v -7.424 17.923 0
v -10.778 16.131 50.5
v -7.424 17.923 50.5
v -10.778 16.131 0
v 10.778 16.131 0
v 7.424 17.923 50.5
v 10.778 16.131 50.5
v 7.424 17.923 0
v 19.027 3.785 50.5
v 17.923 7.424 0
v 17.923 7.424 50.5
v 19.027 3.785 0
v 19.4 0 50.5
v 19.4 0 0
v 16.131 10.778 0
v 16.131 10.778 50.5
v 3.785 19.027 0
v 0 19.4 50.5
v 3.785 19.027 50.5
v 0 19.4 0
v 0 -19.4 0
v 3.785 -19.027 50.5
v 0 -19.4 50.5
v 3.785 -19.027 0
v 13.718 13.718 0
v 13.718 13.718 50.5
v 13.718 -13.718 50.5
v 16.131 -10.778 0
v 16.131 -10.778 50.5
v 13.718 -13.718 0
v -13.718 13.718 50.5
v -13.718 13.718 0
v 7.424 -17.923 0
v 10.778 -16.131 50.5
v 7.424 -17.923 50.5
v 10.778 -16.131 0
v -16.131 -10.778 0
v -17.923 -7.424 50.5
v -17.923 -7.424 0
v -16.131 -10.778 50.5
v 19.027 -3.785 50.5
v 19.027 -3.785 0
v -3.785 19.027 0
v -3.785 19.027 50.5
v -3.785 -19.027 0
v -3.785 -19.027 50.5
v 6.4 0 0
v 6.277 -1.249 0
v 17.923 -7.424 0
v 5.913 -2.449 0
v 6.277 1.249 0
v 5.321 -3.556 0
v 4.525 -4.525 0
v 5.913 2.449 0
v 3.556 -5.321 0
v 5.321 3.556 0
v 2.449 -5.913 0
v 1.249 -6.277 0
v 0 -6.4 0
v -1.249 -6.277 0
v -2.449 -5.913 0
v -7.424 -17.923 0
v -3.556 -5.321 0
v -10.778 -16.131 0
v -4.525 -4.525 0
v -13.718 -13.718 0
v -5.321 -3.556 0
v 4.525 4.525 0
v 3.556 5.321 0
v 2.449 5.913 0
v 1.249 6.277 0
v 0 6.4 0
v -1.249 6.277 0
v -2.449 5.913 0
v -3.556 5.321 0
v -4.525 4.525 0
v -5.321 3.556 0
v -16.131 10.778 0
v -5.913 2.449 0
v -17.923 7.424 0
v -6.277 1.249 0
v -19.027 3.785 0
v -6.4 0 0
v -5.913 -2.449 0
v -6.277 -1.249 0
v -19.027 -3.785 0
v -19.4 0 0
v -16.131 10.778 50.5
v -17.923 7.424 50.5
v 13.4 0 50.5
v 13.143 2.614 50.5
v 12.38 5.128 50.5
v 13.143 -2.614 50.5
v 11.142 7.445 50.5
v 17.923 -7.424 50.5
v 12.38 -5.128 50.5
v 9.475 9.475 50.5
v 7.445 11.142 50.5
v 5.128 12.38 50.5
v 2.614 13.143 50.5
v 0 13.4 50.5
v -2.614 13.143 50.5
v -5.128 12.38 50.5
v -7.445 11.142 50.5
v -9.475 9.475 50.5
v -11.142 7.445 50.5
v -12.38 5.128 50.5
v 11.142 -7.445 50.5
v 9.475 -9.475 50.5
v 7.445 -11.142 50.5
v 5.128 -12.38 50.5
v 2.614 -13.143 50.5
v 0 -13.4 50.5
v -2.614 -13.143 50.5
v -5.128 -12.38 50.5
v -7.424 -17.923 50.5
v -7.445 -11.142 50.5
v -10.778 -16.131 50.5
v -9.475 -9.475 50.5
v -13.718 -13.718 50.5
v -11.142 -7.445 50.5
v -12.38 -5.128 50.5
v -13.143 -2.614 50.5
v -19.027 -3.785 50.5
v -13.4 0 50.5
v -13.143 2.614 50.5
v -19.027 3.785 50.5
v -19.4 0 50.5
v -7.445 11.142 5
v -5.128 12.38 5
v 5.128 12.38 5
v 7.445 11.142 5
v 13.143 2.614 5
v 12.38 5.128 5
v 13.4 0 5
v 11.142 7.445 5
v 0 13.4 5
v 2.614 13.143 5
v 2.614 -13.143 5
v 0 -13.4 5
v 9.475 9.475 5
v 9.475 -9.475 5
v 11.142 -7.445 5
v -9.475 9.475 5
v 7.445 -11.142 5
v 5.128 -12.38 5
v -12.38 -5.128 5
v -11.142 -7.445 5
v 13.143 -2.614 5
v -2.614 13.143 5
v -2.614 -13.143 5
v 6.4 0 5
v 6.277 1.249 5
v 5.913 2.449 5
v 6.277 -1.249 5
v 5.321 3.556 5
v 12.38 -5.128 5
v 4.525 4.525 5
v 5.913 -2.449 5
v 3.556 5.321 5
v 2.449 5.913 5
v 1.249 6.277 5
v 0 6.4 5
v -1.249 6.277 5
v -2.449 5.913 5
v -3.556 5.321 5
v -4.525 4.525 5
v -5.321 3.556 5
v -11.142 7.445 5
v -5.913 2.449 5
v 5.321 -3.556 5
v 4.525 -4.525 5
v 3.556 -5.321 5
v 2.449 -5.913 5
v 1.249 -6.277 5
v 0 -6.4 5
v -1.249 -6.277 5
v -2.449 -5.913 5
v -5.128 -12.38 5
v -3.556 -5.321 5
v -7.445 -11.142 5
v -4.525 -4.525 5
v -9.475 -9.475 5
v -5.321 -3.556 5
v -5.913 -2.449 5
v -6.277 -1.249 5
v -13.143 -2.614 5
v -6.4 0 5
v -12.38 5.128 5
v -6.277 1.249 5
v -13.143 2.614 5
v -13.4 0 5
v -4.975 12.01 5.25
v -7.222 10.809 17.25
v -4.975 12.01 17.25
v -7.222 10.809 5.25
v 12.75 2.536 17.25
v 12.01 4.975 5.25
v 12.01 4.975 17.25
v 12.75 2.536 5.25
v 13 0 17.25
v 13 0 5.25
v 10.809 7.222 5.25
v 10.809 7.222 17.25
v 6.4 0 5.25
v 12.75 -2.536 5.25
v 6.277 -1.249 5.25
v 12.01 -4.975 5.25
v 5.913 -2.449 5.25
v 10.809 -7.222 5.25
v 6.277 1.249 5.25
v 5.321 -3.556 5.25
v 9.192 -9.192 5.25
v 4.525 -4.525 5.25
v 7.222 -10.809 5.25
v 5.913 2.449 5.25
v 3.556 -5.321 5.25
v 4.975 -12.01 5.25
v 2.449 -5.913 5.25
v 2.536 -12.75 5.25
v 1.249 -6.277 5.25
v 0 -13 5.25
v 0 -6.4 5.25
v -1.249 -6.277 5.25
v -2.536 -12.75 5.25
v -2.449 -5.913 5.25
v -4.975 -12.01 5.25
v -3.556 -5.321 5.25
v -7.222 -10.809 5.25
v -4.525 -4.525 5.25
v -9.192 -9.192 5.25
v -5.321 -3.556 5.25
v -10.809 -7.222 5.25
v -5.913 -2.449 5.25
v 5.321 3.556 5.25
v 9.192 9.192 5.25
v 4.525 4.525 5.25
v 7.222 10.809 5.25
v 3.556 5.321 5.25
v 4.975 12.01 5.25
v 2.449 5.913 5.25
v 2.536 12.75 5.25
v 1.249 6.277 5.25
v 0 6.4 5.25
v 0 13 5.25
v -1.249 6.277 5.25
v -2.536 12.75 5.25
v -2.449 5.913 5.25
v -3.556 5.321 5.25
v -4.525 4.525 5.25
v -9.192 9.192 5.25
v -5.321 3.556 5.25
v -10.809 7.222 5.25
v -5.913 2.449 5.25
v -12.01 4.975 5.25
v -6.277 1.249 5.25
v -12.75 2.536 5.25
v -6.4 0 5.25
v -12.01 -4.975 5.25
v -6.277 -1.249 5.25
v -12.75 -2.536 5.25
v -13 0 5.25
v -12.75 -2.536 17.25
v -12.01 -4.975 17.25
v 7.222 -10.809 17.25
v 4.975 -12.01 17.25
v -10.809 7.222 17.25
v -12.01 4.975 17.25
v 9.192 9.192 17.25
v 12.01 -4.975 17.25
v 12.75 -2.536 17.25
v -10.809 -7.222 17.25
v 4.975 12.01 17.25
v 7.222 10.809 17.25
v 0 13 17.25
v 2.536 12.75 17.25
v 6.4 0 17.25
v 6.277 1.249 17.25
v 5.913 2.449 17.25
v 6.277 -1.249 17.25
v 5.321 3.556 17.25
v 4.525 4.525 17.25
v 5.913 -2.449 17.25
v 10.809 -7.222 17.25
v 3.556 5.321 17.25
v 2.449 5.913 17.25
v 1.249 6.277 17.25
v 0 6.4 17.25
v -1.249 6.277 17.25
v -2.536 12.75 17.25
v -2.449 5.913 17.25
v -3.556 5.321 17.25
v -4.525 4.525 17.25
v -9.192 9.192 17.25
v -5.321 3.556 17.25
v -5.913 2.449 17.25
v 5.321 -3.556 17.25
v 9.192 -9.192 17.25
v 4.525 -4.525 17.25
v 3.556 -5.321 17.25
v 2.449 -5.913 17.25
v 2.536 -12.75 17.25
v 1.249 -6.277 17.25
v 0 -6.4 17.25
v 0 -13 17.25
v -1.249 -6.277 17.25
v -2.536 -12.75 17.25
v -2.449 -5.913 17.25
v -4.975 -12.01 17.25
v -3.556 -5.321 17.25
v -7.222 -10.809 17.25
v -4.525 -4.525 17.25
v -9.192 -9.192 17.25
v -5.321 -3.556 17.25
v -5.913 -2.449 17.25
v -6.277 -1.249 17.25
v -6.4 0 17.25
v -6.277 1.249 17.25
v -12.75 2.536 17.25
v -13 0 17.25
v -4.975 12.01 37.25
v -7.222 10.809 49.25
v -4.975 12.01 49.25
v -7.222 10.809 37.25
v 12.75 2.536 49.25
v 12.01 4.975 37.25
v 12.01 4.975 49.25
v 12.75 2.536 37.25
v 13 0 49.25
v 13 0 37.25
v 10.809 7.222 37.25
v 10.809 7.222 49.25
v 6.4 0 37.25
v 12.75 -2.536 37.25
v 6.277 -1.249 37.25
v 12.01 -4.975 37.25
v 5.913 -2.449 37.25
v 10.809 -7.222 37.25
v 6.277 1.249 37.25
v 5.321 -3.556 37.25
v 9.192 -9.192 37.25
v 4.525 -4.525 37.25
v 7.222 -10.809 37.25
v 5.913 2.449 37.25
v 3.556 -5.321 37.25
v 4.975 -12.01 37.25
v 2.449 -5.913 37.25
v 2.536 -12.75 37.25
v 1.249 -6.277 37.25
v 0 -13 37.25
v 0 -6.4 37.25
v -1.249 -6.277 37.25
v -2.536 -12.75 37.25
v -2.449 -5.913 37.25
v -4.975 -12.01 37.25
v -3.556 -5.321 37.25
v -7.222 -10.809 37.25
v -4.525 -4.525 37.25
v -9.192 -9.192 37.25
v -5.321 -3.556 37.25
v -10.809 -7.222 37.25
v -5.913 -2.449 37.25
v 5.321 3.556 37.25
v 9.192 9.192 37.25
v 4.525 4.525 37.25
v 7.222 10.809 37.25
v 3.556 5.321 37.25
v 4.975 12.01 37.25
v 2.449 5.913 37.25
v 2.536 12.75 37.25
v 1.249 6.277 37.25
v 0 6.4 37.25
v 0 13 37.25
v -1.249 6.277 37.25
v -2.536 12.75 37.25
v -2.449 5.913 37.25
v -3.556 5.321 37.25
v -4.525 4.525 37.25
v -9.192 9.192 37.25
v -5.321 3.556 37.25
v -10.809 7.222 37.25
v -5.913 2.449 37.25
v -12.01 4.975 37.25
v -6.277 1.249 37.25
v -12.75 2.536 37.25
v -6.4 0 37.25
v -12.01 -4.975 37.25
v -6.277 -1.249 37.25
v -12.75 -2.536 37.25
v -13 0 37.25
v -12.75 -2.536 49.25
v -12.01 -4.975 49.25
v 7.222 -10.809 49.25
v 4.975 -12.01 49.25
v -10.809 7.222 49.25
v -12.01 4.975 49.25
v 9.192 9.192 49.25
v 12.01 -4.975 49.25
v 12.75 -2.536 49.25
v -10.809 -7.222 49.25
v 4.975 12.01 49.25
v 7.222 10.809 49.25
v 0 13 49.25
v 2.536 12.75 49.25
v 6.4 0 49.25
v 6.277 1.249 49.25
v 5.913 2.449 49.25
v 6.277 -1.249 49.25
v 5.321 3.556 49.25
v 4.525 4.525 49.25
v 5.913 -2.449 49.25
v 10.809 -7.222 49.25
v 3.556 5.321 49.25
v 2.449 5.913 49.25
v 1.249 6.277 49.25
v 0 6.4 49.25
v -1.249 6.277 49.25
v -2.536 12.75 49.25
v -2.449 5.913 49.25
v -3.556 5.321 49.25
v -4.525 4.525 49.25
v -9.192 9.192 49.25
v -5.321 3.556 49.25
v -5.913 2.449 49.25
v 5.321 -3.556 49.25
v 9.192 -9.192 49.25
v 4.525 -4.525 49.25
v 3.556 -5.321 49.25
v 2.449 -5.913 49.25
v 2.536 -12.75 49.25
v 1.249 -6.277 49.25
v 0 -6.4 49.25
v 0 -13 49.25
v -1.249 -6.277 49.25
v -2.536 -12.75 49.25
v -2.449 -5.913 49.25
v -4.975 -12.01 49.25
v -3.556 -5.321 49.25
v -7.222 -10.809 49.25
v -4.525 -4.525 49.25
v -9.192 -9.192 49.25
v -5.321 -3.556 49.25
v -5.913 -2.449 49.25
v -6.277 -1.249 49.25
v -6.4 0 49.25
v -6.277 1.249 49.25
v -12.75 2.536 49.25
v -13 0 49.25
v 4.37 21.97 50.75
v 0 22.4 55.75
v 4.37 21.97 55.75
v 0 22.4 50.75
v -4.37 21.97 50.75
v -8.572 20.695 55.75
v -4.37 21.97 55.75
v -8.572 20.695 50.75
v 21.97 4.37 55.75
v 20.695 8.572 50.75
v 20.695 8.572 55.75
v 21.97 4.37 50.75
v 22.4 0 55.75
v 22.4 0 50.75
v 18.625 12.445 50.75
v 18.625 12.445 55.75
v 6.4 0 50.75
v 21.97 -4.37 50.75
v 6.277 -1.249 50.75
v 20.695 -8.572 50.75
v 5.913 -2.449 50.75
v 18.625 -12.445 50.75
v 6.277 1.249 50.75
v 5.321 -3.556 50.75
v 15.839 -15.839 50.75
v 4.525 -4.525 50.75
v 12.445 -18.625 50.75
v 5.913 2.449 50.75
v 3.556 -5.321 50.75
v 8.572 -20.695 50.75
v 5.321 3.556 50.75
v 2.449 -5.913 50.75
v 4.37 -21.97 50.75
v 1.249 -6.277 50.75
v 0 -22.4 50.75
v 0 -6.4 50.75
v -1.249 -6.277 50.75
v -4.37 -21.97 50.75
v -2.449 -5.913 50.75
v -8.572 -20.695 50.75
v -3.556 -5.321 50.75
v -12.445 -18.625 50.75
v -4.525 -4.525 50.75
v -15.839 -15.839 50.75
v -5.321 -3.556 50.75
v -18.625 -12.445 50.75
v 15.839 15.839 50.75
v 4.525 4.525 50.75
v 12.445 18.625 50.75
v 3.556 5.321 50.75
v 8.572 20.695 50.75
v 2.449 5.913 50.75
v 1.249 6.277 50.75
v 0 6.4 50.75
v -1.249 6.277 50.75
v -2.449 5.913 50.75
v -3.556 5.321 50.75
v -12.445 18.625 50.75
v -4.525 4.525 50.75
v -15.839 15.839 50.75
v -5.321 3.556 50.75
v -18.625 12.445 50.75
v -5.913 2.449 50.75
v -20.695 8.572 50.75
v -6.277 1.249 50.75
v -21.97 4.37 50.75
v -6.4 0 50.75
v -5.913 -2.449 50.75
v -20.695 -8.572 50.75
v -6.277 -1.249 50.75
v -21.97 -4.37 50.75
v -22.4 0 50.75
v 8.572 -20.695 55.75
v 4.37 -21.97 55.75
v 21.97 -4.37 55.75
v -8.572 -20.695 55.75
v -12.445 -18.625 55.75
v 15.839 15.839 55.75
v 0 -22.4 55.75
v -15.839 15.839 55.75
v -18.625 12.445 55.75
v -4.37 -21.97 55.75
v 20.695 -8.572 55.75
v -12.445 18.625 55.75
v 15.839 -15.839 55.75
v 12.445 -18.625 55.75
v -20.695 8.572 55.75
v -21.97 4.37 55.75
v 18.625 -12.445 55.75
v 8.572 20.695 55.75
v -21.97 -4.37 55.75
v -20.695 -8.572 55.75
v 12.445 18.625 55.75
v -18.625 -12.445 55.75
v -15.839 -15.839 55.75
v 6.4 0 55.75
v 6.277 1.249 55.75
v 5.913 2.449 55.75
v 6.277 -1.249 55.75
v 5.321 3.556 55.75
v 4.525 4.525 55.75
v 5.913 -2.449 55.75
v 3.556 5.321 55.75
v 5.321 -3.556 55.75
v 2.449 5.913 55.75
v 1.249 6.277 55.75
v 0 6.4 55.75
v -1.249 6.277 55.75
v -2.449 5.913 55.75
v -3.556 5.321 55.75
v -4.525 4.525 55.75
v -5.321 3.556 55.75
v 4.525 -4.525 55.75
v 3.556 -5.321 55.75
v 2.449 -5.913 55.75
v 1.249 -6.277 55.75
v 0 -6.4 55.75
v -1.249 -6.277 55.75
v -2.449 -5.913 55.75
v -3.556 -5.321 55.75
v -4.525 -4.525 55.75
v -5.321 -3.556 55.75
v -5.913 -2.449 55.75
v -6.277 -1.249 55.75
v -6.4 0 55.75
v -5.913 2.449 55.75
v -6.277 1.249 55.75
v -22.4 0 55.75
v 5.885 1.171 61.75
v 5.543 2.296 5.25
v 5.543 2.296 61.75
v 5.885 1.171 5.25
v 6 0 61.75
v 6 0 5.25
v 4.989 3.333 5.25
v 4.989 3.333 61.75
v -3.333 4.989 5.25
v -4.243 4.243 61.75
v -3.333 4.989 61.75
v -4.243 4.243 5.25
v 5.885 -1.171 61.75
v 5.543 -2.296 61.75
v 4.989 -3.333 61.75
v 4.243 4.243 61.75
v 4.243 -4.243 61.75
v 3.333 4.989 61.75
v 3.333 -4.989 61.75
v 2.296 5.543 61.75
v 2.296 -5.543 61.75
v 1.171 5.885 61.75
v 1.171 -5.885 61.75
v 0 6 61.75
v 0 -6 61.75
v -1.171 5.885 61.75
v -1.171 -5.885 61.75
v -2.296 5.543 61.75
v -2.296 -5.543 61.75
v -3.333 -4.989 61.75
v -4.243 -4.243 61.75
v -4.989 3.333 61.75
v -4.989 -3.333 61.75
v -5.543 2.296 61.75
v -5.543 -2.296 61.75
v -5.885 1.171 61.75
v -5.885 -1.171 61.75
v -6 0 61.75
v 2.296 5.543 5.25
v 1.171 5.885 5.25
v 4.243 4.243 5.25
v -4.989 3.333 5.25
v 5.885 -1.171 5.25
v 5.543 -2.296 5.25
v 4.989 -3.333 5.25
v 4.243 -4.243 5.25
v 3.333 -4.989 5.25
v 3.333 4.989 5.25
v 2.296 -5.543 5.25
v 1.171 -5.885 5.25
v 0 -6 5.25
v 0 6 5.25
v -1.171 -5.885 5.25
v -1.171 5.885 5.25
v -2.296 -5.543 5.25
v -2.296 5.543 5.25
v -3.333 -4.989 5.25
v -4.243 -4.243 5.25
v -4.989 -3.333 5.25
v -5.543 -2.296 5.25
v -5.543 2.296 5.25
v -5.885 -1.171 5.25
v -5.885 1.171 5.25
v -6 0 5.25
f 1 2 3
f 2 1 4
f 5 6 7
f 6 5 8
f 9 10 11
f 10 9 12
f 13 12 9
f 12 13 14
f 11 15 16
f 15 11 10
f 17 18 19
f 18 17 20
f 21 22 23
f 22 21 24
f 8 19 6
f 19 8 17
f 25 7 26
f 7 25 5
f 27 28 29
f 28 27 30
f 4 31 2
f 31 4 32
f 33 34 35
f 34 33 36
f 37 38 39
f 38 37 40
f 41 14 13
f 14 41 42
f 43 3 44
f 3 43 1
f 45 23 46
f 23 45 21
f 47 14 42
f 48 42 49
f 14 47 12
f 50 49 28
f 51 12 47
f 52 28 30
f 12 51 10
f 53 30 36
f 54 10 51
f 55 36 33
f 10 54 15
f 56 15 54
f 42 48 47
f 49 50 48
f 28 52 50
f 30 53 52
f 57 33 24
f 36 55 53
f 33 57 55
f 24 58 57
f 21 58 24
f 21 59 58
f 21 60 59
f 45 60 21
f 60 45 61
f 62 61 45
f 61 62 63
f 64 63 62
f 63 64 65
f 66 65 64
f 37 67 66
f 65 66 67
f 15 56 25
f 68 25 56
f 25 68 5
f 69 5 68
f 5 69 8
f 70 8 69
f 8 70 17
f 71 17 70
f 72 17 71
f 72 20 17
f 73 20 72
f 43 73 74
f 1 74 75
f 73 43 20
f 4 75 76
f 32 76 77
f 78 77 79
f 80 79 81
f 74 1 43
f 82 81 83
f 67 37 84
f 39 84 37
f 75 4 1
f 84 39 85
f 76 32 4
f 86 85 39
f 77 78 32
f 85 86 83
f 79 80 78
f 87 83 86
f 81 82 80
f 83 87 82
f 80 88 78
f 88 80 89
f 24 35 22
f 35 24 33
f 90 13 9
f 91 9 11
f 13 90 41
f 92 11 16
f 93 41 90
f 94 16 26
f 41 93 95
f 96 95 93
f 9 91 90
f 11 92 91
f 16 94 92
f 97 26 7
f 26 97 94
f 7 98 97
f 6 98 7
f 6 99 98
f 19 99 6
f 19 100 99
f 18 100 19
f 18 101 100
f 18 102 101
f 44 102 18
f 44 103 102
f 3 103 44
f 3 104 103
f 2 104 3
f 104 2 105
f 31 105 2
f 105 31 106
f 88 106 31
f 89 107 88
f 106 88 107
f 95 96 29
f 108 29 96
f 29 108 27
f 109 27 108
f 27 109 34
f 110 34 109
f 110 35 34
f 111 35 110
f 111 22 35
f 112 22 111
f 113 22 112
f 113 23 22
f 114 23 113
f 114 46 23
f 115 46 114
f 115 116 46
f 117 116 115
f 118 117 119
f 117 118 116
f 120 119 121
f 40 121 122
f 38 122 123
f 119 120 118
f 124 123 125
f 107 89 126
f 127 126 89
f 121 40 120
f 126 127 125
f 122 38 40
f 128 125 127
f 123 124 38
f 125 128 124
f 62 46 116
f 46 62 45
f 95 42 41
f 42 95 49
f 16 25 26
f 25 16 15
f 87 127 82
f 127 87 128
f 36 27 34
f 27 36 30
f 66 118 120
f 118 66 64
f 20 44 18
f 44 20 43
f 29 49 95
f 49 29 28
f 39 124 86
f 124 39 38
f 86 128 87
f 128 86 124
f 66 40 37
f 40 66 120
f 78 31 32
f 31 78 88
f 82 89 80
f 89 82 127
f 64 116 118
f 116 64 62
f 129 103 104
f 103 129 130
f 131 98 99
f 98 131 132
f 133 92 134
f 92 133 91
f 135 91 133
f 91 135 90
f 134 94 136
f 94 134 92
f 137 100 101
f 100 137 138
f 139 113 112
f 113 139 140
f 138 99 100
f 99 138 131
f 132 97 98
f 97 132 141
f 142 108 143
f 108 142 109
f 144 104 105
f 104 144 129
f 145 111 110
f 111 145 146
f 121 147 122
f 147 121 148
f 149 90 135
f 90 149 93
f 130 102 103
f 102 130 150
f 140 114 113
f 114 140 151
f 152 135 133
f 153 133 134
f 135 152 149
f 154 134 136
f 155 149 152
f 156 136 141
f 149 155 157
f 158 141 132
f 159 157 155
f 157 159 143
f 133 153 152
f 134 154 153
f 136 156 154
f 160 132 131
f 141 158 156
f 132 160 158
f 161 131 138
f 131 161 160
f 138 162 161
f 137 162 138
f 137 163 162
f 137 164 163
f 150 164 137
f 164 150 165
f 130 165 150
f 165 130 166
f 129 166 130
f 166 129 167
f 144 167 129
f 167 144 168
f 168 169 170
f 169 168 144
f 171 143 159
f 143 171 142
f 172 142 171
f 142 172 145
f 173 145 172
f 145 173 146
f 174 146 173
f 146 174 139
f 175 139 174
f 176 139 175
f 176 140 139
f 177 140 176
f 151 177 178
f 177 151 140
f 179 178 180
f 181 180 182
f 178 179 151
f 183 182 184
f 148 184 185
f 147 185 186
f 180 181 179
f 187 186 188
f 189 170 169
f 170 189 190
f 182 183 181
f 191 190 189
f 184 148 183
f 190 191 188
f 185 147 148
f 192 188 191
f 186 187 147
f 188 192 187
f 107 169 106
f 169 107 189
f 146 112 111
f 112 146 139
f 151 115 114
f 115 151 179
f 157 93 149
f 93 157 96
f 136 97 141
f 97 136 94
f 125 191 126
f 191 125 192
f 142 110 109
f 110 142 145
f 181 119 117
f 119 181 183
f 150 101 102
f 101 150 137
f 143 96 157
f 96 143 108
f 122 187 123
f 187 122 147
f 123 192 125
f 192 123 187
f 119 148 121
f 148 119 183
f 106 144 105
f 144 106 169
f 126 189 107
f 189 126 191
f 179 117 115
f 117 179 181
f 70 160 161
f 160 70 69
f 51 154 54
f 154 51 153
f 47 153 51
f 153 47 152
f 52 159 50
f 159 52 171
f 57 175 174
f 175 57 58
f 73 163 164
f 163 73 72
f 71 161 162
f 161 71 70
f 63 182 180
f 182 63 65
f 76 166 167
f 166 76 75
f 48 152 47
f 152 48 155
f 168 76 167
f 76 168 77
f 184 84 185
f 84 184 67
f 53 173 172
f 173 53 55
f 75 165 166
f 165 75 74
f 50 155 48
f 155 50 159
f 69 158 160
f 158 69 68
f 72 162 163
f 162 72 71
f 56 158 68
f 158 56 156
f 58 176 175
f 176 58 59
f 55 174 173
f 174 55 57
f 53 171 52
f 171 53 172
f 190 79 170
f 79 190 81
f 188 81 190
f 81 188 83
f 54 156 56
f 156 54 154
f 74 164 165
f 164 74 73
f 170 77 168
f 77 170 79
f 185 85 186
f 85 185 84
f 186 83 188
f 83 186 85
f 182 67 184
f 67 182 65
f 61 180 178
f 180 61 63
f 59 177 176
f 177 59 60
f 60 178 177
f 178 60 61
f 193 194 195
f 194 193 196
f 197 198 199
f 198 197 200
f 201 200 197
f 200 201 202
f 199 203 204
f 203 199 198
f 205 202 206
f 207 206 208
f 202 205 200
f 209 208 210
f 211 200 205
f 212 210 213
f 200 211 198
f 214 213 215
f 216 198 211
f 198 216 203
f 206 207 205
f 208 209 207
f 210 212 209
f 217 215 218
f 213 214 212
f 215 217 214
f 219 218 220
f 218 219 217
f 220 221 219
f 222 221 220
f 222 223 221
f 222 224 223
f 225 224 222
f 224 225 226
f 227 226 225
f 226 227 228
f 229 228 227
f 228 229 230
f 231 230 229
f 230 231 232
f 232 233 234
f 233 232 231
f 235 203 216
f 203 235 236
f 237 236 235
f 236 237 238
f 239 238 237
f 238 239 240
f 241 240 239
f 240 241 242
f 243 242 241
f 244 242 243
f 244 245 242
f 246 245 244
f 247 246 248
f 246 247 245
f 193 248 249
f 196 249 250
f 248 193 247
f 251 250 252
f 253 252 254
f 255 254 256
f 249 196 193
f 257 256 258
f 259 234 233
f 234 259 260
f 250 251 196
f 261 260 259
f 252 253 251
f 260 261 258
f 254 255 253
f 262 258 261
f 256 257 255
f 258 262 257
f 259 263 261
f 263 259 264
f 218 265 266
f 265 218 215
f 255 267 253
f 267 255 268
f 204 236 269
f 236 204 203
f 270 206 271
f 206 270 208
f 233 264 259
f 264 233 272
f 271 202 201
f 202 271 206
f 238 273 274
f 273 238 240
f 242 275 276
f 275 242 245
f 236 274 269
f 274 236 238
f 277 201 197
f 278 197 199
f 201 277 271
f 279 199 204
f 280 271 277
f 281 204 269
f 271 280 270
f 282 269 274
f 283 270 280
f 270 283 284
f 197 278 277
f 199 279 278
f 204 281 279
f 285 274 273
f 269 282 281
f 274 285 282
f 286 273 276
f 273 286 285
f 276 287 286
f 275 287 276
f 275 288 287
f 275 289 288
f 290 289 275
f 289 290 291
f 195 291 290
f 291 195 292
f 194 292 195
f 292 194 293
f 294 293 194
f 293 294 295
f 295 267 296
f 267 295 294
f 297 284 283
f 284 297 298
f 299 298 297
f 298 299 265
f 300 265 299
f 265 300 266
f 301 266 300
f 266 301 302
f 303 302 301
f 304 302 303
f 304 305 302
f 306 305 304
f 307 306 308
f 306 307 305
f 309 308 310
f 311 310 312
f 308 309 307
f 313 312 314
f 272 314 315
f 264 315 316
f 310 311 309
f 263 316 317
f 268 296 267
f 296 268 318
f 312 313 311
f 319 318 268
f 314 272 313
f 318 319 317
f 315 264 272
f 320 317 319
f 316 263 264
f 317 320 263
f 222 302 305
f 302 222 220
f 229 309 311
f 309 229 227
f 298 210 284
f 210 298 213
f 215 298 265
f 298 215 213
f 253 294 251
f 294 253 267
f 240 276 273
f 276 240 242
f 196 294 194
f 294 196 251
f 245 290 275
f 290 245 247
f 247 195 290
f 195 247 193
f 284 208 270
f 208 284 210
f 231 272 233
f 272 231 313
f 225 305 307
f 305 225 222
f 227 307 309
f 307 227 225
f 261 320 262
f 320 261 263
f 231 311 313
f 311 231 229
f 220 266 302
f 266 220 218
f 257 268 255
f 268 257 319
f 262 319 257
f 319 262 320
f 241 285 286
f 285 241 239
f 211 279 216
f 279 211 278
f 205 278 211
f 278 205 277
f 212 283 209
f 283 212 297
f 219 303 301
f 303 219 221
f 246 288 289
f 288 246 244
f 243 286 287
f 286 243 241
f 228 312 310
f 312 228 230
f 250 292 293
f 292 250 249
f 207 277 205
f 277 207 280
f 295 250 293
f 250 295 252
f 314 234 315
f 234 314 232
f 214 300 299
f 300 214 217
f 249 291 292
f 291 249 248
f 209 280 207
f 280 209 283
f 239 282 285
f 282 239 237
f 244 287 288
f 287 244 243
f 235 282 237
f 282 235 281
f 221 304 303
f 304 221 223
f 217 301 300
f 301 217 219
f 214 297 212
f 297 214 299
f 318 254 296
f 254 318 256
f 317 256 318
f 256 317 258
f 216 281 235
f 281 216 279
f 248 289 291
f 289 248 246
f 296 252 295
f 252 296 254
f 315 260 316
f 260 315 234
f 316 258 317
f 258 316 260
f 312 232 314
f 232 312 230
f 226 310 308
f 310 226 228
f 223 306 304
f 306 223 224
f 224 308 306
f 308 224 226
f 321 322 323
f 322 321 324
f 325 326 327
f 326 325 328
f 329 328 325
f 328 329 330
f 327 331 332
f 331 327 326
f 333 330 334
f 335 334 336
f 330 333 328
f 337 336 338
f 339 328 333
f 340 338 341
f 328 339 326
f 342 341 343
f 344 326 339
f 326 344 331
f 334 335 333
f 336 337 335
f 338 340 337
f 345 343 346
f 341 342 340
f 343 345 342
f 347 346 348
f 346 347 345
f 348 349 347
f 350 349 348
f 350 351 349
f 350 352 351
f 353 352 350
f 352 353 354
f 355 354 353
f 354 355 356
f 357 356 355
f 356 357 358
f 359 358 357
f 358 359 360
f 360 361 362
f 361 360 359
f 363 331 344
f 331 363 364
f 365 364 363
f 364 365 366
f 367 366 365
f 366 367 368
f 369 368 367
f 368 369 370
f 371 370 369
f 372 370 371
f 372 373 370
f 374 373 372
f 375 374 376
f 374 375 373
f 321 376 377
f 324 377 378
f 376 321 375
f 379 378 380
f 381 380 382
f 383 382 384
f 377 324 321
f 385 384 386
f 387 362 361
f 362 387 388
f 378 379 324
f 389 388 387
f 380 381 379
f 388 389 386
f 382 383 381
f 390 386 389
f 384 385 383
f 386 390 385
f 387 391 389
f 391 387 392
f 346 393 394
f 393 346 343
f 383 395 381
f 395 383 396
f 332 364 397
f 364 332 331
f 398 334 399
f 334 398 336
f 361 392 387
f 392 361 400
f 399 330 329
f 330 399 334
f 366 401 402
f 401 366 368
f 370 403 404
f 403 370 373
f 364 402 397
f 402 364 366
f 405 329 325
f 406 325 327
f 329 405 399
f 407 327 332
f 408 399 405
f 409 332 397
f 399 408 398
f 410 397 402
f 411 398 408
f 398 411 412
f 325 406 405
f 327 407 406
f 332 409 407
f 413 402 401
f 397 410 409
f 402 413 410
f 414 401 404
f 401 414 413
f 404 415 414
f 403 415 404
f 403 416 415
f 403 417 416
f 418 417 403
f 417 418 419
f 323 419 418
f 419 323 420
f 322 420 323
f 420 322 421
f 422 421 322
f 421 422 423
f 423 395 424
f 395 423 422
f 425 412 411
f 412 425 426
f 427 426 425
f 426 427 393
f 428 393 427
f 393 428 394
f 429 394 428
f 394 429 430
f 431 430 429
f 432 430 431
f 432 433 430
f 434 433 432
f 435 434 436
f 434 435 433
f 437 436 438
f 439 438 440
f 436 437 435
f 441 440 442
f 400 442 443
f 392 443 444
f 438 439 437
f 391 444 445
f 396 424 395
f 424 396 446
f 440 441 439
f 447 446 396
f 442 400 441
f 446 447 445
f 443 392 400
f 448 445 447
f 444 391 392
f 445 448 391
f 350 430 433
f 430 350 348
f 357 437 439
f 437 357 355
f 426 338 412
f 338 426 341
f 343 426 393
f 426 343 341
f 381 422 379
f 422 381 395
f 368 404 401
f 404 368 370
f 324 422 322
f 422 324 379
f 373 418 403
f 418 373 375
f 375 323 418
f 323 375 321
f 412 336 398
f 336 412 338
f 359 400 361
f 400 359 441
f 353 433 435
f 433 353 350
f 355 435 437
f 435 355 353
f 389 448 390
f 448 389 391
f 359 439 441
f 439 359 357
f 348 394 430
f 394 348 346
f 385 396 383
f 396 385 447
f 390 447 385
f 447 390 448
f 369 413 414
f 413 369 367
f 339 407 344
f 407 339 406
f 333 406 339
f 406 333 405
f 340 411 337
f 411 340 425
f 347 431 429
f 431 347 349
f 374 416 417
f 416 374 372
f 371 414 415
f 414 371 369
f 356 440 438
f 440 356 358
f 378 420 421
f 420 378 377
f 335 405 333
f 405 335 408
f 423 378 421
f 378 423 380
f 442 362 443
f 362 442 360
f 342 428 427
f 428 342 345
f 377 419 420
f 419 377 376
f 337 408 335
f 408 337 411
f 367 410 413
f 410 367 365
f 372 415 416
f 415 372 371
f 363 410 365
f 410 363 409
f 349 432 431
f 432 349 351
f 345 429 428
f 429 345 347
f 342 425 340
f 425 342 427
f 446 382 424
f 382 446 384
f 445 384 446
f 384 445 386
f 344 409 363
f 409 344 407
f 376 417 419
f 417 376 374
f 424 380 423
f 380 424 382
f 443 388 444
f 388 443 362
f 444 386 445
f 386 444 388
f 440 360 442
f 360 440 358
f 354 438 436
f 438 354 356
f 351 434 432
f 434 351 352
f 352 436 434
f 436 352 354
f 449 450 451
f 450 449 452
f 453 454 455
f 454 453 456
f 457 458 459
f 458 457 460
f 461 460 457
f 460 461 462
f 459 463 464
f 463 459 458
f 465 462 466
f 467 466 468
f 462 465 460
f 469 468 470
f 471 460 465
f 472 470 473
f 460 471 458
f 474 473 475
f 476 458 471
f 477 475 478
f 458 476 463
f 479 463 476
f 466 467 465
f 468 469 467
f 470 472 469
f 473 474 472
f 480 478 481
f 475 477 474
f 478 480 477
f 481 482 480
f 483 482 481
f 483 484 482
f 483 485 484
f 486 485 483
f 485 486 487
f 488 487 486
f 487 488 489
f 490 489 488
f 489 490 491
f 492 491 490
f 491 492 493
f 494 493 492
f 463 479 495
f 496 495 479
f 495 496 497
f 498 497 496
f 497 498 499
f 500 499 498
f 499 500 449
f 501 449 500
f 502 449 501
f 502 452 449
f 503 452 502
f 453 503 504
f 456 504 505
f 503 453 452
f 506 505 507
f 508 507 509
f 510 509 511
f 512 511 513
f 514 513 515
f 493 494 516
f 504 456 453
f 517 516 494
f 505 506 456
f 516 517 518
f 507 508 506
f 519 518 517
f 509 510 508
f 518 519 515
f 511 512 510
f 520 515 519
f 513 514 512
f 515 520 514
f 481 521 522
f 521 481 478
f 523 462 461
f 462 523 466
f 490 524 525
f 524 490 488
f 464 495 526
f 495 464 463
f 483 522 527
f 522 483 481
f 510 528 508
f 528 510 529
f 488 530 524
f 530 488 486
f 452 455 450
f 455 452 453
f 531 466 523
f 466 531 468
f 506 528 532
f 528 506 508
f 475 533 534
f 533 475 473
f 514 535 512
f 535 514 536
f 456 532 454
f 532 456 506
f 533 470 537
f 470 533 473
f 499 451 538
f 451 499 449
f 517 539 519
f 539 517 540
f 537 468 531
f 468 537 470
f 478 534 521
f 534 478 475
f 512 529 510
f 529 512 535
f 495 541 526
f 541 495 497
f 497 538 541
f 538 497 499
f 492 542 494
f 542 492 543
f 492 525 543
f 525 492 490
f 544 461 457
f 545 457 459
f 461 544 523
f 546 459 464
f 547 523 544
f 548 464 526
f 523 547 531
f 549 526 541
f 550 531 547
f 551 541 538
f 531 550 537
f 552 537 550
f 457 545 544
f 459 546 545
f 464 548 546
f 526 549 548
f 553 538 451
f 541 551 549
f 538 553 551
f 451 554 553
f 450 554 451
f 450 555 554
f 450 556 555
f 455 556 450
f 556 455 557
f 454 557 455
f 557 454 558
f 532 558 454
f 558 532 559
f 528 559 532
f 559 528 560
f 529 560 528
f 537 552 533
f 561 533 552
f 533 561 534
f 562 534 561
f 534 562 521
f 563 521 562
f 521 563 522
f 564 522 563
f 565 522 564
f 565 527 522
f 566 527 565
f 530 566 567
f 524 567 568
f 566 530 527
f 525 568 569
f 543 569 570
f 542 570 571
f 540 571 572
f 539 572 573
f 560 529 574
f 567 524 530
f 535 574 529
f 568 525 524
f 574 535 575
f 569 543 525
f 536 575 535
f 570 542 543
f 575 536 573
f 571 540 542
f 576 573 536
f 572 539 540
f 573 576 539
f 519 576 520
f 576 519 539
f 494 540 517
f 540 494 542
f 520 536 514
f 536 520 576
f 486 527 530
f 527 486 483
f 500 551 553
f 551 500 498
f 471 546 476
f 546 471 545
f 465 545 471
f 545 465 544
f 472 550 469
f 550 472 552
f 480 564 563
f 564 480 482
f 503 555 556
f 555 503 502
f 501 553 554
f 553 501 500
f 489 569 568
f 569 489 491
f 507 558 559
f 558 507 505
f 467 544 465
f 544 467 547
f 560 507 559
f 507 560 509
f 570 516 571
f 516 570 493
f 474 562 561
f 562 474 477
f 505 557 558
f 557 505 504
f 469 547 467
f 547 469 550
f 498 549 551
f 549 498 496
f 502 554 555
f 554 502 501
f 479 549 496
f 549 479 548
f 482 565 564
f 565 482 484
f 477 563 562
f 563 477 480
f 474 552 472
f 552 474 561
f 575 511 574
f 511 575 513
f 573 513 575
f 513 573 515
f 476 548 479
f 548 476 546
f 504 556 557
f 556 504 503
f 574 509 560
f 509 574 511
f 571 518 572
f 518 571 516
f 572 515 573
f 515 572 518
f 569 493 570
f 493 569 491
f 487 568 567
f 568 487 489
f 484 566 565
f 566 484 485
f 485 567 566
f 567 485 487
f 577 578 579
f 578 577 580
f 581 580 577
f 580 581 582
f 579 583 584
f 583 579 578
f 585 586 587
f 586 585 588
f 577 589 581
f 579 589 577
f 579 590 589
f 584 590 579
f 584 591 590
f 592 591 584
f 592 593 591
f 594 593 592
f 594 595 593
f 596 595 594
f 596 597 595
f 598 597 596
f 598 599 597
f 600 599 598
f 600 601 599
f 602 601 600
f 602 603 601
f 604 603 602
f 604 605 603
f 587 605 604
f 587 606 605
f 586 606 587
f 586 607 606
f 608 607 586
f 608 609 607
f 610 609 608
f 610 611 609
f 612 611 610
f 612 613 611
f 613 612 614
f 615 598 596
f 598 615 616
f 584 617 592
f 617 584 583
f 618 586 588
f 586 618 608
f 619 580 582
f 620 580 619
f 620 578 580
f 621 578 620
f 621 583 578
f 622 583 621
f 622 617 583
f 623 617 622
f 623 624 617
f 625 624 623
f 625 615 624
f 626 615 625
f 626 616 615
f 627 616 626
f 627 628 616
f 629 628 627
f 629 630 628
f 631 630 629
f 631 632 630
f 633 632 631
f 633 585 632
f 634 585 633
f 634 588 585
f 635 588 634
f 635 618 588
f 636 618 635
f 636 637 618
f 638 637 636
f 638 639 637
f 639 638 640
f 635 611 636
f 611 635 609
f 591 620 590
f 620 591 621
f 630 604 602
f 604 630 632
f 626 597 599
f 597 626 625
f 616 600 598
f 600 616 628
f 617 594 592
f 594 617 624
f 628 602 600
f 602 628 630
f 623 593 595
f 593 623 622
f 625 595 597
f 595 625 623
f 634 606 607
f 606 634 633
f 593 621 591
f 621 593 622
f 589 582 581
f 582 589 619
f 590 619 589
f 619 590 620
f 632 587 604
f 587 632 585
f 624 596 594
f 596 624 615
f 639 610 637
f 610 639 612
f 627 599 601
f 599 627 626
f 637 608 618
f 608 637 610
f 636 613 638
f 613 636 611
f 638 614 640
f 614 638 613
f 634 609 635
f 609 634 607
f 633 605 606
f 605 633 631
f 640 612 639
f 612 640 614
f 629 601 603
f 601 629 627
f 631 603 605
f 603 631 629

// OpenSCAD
$fn = 32;

// ------------------------------------------------------------------------
// Shaft station: cup d38.8 x 50.5 mm, shaft d12
// Every part is its own module, assembly() places every instance.
// ------------------------------------------------------------------------

// --- part 1 ---
module housing_cup() {
  difference() {
    cylinder(h = 50.5, d = 38.8);
    translate([0, 0, 5]) cylinder(h = 46.5, d = 26.8);
    translate([0, 0, -1]) cylinder(h = 7, d = 12.8);
  }
}

// --- part 2 ---
module bearing_lower() {
  difference() {
      translate([0, 0, 0]) cylinder(h = 12, d = 26);
      translate([0, 0, -1]) cylinder(h = 14, d = 12.8);
    }
}

// --- part 3 ---
module bearing_upper() {
  difference() {
      translate([0, 0, 0]) cylinder(h = 12, d = 26);
      translate([0, 0, -1]) cylinder(h = 14, d = 12.8);
    }
}

// --- part 4 ---
module station_shaft() {
  translate([0, 0, -28.25]) cylinder(h = 56.5, d = 12);
}

// --- part 5 ---
module station_cover() {
  difference() {
    cylinder(h = 5, d = 44.8);
    translate([0, 0, -1]) cylinder(h = 7, d = 12.8);
  }
}

// --- assembly ---
module assembly() {
  color([0.80, 0.24, 0.20]) translate([0, 0, 0]) rotate([0, 0, 0]) housing_cup();
  color([0.20, 0.45, 0.75]) translate([0, 0, 5.25]) rotate([0, 0, 0]) bearing_lower();
  color([0.25, 0.62, 0.32]) translate([0, 0, 37.25]) rotate([0, 0, 0]) bearing_upper();
  color([0.92, 0.70, 0.18]) translate([0, 0, 33.5]) rotate([0, 0, 0]) station_shaft();
  color([0.58, 0.35, 0.70]) translate([0, 0, 50.75]) rotate([0, 0, 0]) station_cover();
}

assembly();
